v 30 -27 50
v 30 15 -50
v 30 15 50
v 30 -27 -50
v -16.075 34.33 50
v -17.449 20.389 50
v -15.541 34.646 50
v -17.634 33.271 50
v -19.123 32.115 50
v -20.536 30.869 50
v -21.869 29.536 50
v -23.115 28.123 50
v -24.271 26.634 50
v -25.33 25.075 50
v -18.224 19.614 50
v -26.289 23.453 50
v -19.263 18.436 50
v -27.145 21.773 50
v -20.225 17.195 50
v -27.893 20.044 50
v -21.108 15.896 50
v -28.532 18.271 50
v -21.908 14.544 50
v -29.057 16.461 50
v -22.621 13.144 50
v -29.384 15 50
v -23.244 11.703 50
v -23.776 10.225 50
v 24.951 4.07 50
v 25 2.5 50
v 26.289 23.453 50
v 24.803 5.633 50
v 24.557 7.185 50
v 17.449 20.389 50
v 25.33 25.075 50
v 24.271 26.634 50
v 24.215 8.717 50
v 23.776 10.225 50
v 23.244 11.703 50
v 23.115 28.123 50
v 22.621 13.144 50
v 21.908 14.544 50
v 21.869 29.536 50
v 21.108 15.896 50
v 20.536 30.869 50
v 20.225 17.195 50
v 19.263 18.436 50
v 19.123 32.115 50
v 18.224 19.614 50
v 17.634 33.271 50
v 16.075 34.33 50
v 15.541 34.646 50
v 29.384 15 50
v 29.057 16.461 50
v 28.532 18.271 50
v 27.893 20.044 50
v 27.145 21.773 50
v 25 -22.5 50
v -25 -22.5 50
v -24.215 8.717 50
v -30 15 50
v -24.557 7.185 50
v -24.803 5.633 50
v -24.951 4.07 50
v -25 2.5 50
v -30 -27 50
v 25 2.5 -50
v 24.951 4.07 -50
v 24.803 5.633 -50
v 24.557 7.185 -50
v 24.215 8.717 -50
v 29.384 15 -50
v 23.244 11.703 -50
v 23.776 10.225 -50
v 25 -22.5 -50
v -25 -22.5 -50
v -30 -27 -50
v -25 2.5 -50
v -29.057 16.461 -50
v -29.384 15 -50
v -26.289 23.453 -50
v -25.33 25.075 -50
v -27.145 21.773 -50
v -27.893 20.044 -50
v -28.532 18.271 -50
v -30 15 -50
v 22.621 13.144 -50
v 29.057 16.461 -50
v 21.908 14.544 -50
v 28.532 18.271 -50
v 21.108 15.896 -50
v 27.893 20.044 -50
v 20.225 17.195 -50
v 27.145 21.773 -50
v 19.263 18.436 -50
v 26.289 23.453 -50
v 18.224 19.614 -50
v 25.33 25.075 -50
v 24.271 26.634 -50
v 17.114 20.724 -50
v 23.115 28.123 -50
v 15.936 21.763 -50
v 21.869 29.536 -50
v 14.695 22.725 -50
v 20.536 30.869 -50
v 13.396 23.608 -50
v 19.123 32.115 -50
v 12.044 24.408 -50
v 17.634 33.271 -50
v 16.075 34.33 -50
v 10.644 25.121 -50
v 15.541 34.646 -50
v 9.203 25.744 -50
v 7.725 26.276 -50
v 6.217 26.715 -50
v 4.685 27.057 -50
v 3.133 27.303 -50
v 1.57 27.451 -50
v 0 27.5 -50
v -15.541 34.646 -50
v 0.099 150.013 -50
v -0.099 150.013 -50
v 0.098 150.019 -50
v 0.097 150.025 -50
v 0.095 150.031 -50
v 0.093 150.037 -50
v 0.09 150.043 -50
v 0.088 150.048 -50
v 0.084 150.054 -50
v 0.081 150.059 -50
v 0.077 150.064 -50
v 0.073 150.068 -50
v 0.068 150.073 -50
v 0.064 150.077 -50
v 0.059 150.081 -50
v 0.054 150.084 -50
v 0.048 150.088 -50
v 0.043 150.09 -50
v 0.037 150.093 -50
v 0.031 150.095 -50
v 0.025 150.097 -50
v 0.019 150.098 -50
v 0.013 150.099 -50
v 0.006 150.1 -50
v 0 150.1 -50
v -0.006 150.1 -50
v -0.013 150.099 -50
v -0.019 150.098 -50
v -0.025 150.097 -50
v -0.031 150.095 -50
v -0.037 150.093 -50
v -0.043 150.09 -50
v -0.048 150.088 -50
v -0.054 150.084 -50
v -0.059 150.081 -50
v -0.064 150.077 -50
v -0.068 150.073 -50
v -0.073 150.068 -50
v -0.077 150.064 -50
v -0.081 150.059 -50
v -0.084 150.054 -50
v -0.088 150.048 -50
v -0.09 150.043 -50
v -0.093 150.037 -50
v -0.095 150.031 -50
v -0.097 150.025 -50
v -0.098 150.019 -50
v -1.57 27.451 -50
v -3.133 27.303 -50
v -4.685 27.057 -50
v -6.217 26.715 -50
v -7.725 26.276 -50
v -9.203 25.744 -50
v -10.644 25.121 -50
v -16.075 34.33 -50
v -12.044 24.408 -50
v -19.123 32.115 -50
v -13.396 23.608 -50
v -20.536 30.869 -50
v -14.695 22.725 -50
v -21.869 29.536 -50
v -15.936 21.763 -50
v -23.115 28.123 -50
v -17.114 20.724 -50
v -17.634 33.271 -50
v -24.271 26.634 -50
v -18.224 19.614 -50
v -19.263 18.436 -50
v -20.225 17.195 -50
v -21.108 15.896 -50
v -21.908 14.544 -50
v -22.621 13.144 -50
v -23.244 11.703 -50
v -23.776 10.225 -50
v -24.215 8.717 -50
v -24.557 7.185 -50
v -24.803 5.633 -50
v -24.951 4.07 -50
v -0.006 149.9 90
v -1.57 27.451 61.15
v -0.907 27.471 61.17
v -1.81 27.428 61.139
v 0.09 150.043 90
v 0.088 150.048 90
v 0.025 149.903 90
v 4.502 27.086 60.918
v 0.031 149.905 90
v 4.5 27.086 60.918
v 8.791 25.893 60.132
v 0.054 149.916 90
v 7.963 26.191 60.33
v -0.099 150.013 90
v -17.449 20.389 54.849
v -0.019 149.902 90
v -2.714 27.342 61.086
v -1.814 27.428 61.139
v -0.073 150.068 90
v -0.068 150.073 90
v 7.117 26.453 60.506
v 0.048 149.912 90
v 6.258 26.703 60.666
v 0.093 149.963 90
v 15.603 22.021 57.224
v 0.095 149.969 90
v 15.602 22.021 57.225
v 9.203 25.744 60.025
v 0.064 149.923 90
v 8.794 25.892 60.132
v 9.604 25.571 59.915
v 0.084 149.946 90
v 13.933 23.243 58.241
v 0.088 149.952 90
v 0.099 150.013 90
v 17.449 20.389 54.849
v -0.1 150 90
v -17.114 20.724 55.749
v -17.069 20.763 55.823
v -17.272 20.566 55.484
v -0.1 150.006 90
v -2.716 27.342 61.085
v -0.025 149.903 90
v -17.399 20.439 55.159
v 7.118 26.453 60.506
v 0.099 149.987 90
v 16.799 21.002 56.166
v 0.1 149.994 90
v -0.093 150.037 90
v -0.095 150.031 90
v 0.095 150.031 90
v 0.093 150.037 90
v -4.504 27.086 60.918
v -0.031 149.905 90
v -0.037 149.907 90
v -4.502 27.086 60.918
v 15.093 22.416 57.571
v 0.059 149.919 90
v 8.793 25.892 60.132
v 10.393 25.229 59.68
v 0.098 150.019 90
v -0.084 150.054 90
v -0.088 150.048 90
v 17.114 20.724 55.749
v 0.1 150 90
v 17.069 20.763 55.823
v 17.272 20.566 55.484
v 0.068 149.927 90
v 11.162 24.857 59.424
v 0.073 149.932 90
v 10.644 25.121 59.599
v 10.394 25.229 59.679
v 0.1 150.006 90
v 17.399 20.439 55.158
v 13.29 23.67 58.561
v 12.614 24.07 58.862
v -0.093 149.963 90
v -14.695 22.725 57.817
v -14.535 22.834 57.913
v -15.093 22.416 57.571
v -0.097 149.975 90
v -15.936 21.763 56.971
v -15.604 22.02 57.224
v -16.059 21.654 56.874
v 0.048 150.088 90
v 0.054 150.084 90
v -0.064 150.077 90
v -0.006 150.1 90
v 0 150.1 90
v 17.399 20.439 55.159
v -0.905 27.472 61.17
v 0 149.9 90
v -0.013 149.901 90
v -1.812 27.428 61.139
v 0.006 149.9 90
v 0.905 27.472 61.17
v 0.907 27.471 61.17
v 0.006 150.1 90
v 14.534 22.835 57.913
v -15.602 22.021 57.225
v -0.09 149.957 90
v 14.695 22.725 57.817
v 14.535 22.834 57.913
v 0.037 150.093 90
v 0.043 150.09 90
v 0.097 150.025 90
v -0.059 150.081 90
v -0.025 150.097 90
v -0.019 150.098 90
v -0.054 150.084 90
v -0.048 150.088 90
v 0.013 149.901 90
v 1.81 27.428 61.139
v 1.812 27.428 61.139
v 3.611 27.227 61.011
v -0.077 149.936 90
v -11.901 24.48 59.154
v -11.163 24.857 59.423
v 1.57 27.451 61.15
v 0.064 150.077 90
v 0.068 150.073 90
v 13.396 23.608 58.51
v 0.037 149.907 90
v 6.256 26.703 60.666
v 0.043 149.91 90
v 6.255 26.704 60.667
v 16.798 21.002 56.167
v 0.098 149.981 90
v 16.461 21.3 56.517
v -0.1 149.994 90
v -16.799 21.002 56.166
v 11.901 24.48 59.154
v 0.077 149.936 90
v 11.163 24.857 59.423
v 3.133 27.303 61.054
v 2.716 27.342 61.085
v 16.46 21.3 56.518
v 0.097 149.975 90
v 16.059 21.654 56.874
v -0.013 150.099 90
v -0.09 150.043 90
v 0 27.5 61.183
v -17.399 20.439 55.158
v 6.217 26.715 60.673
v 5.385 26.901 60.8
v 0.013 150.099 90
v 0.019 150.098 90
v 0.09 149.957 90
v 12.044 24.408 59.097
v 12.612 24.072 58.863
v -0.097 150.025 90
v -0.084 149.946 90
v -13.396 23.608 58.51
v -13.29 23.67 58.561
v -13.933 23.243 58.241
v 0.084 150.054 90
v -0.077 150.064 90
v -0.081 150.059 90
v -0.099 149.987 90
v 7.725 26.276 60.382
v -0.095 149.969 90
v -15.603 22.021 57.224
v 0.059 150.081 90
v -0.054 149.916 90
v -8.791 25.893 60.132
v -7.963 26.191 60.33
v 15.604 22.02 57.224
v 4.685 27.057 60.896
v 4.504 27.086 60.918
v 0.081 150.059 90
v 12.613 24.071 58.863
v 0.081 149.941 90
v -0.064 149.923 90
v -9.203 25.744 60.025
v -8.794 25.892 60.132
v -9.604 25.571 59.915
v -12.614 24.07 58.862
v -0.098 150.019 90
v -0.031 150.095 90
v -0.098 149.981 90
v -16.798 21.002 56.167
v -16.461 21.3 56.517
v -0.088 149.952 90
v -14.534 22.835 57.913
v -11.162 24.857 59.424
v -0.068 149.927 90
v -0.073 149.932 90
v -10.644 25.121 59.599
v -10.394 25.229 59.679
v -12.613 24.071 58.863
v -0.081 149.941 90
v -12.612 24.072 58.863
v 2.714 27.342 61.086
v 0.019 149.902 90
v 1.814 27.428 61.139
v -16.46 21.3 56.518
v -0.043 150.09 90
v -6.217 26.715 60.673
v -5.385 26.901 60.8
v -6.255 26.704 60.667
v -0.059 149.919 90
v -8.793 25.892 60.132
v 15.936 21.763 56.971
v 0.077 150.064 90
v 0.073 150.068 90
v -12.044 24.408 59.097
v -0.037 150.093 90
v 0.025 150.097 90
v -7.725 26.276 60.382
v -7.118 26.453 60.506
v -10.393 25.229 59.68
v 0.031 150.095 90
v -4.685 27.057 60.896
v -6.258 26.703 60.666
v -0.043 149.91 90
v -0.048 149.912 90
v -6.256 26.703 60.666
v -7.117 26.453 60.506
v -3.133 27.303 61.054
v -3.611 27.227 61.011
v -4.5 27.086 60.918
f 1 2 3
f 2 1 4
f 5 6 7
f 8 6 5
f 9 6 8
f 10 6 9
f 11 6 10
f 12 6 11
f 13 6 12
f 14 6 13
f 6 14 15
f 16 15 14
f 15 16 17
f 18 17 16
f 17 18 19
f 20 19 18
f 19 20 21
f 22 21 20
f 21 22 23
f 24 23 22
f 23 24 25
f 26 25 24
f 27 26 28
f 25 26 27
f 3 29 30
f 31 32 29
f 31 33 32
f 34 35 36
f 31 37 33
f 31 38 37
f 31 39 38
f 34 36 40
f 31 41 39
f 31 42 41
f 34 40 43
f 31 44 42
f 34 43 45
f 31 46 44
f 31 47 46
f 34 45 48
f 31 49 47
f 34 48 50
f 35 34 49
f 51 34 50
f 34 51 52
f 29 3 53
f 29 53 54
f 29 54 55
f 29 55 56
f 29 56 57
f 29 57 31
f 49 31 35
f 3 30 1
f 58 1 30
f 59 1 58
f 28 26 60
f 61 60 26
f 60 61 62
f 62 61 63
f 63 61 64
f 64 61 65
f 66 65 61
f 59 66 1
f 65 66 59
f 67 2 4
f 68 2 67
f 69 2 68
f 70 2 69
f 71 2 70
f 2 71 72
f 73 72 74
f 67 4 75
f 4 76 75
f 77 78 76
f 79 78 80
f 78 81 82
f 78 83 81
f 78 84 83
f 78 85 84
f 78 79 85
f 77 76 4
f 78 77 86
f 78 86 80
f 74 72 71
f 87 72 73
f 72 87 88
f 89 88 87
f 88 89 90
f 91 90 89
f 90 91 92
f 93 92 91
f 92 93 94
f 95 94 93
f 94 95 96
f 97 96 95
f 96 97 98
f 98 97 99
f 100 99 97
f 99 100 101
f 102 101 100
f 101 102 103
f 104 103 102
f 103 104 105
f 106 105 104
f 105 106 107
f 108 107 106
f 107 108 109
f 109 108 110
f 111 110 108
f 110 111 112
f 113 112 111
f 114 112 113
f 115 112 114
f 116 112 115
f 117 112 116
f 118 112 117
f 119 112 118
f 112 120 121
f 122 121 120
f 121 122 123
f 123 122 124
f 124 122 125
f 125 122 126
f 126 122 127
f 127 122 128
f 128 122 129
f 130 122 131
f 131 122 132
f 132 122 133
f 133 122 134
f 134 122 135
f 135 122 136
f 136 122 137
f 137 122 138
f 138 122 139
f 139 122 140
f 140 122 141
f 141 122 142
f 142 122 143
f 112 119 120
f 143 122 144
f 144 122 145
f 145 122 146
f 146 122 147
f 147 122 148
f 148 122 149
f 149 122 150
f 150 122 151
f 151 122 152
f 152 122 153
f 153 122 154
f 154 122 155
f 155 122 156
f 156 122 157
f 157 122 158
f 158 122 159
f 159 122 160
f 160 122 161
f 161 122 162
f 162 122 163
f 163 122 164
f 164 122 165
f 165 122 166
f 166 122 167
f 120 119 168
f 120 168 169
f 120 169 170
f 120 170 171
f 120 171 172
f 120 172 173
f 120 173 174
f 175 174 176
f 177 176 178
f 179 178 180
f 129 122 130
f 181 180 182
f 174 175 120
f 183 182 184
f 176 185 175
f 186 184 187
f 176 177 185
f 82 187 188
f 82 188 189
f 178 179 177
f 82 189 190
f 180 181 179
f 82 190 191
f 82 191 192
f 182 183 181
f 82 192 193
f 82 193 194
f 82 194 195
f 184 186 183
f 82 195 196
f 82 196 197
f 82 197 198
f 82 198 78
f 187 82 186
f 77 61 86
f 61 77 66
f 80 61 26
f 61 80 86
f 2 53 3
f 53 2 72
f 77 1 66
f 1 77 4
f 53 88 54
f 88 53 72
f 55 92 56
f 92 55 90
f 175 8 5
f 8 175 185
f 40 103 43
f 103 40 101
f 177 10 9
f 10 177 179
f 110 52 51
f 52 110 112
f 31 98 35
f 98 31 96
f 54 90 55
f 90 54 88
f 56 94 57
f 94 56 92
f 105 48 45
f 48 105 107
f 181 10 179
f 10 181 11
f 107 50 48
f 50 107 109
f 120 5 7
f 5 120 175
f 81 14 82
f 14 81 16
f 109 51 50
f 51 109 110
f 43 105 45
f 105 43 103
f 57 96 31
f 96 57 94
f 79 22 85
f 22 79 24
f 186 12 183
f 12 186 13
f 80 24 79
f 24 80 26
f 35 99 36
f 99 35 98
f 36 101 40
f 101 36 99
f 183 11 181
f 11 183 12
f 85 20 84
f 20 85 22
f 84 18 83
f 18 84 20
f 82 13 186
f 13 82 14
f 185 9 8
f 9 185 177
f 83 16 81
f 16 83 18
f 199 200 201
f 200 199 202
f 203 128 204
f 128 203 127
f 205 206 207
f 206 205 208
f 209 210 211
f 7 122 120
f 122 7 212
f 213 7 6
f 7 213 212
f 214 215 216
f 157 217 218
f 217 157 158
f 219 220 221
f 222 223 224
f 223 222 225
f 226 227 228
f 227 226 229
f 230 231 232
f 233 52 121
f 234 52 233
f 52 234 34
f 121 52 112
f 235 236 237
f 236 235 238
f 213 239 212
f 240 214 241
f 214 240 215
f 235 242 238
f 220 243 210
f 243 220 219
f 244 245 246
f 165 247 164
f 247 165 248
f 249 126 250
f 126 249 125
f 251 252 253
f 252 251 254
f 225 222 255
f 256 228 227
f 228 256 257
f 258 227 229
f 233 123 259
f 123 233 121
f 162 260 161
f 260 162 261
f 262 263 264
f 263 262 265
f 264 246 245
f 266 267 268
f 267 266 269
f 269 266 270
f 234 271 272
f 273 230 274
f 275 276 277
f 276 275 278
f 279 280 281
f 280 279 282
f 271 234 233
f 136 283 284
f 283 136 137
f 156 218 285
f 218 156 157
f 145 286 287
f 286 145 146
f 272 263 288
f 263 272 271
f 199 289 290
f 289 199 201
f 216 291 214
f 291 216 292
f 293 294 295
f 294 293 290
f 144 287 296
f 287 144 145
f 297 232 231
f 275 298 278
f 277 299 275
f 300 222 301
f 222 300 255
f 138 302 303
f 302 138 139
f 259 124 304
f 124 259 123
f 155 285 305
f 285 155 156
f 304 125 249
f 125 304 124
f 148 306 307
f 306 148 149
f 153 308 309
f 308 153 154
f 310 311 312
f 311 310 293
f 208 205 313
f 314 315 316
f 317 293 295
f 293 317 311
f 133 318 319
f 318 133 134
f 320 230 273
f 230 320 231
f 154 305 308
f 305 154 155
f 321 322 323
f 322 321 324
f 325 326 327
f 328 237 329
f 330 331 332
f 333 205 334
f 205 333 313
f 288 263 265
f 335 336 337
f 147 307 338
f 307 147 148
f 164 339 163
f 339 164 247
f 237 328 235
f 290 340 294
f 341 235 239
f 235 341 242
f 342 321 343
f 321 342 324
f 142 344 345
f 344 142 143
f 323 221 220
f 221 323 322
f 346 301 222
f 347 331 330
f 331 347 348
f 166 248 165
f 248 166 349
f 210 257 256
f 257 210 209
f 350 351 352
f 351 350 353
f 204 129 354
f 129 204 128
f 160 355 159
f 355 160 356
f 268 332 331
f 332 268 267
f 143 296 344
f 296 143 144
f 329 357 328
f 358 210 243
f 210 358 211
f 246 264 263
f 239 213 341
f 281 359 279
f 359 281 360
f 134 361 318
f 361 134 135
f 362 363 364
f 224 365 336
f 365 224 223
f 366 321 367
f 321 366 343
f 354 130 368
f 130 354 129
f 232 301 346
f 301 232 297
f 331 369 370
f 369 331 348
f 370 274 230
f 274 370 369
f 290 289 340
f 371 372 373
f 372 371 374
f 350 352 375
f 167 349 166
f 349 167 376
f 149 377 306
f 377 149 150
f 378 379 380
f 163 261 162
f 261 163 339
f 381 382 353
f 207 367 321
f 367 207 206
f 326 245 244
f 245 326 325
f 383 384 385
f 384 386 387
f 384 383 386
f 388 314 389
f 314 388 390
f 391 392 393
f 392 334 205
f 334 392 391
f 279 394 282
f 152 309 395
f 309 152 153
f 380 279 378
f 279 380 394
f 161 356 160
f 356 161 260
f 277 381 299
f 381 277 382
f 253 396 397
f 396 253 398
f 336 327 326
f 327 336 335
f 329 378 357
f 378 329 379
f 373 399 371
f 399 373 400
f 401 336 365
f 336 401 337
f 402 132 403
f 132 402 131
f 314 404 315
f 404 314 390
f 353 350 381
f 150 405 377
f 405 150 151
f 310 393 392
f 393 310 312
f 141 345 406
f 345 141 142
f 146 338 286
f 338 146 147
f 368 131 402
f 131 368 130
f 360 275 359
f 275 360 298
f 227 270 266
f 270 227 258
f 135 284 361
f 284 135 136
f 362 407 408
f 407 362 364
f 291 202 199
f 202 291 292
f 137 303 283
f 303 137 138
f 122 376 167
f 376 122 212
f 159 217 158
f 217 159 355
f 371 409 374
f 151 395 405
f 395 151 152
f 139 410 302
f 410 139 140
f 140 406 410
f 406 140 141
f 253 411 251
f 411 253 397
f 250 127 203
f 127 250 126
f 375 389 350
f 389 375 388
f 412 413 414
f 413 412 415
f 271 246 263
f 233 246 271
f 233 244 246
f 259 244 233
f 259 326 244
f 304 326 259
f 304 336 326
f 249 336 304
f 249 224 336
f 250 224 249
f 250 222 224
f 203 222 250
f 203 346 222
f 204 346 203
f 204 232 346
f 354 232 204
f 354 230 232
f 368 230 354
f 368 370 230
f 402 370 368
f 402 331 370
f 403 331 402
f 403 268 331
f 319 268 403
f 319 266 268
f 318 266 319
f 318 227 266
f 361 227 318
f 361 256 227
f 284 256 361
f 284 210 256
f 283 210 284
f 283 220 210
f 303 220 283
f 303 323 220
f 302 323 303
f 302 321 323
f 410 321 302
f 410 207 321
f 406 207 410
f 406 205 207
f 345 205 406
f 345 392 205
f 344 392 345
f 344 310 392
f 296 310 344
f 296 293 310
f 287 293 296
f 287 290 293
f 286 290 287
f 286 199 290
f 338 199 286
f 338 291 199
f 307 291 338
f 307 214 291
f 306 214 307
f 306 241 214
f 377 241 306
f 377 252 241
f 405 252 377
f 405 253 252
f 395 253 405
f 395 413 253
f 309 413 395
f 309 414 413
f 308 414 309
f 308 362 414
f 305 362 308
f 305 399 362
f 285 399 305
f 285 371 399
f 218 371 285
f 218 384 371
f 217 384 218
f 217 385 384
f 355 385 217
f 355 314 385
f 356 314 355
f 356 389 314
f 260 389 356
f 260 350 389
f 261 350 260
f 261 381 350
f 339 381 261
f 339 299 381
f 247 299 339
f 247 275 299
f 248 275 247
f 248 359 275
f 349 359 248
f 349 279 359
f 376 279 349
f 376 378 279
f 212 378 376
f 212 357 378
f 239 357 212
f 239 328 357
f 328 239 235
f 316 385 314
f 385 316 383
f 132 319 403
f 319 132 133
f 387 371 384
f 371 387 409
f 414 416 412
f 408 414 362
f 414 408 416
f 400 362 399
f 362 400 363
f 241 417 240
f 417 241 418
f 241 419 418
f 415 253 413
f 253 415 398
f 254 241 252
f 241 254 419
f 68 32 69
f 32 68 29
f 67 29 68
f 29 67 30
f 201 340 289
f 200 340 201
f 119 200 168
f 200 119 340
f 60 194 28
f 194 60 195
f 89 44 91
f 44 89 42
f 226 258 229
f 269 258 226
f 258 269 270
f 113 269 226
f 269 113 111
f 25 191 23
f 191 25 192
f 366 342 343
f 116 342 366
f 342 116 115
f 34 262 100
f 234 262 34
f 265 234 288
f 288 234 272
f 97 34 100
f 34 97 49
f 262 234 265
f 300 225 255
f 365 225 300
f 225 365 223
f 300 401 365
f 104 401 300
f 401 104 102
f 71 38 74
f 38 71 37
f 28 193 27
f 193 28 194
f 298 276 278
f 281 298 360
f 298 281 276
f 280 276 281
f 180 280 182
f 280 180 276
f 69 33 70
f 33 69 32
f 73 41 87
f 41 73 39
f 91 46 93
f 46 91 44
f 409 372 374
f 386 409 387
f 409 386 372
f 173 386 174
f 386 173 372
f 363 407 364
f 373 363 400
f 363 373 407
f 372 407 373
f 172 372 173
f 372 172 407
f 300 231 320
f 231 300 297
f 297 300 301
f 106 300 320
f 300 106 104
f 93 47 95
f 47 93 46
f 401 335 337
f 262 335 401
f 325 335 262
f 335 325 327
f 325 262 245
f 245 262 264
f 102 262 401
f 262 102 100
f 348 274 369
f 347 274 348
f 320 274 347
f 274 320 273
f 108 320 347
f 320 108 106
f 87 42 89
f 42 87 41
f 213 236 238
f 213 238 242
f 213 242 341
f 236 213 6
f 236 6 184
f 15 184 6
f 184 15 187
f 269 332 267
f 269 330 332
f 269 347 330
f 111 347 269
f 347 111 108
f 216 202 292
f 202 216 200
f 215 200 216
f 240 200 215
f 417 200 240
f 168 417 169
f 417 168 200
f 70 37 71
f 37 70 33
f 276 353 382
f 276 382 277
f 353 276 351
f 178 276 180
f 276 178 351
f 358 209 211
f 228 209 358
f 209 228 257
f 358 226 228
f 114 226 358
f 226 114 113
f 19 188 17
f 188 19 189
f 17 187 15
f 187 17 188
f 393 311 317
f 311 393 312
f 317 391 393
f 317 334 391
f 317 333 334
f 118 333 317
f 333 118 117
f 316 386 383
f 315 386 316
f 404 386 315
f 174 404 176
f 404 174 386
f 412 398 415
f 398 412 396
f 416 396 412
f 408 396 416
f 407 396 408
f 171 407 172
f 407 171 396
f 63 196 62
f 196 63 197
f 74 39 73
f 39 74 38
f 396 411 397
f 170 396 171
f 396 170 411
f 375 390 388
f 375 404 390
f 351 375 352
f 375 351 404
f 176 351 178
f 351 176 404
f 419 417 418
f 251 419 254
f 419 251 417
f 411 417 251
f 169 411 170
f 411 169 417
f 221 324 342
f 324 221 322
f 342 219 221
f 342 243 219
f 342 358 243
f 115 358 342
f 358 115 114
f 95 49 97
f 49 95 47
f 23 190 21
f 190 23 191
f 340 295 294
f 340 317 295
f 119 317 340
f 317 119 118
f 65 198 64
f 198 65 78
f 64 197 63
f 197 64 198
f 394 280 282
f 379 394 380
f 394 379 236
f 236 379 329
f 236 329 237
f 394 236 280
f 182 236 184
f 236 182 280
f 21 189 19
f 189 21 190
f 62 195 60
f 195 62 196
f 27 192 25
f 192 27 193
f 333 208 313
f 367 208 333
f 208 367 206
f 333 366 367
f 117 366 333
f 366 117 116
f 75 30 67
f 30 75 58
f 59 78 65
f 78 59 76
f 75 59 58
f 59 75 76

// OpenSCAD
// Customizable simple axe head

//Customizer Variables

//axe head back
r= 60; //[1:200]

//resolution
n=100; //[1:200]

//axe head height
h=100; //[1:500]

// handle hole radius
x=25; // 

//scale
s=150; //

// blade lip
l=40;//

// roundness
a=20;//

// base blade thickness
b=20;//

module chuck(){
	union(){
translate([0,-0.1*r,0])cube([r,0.7*r,h], center = true);
translate([0,0.3*r/2,0])cylinder(h = h, r1 = r/2, r2 = r/2, center = true, $fn=n);
}
}

module chunk(){
chuck();
hull(){
cylinder(h = h, r1 = b, r2 = b, center = true, $fn=n);
translate([0,s,l/2])cylinder(h = h+l, r1 = 0.1, r2 = 0.1, center = true, $fn=n);
				}
}

module axehead(){
	difference(){
	chunk();	
	translate([0,x*.1,0])cylinder(h = h+l+1, r1 = x, r2 = x, center = true, $fn=n);
	translate([-x,-x*.9,-h/2-1])cube([2*x, x,h+l+1,]);
	}
					}
axehead();
